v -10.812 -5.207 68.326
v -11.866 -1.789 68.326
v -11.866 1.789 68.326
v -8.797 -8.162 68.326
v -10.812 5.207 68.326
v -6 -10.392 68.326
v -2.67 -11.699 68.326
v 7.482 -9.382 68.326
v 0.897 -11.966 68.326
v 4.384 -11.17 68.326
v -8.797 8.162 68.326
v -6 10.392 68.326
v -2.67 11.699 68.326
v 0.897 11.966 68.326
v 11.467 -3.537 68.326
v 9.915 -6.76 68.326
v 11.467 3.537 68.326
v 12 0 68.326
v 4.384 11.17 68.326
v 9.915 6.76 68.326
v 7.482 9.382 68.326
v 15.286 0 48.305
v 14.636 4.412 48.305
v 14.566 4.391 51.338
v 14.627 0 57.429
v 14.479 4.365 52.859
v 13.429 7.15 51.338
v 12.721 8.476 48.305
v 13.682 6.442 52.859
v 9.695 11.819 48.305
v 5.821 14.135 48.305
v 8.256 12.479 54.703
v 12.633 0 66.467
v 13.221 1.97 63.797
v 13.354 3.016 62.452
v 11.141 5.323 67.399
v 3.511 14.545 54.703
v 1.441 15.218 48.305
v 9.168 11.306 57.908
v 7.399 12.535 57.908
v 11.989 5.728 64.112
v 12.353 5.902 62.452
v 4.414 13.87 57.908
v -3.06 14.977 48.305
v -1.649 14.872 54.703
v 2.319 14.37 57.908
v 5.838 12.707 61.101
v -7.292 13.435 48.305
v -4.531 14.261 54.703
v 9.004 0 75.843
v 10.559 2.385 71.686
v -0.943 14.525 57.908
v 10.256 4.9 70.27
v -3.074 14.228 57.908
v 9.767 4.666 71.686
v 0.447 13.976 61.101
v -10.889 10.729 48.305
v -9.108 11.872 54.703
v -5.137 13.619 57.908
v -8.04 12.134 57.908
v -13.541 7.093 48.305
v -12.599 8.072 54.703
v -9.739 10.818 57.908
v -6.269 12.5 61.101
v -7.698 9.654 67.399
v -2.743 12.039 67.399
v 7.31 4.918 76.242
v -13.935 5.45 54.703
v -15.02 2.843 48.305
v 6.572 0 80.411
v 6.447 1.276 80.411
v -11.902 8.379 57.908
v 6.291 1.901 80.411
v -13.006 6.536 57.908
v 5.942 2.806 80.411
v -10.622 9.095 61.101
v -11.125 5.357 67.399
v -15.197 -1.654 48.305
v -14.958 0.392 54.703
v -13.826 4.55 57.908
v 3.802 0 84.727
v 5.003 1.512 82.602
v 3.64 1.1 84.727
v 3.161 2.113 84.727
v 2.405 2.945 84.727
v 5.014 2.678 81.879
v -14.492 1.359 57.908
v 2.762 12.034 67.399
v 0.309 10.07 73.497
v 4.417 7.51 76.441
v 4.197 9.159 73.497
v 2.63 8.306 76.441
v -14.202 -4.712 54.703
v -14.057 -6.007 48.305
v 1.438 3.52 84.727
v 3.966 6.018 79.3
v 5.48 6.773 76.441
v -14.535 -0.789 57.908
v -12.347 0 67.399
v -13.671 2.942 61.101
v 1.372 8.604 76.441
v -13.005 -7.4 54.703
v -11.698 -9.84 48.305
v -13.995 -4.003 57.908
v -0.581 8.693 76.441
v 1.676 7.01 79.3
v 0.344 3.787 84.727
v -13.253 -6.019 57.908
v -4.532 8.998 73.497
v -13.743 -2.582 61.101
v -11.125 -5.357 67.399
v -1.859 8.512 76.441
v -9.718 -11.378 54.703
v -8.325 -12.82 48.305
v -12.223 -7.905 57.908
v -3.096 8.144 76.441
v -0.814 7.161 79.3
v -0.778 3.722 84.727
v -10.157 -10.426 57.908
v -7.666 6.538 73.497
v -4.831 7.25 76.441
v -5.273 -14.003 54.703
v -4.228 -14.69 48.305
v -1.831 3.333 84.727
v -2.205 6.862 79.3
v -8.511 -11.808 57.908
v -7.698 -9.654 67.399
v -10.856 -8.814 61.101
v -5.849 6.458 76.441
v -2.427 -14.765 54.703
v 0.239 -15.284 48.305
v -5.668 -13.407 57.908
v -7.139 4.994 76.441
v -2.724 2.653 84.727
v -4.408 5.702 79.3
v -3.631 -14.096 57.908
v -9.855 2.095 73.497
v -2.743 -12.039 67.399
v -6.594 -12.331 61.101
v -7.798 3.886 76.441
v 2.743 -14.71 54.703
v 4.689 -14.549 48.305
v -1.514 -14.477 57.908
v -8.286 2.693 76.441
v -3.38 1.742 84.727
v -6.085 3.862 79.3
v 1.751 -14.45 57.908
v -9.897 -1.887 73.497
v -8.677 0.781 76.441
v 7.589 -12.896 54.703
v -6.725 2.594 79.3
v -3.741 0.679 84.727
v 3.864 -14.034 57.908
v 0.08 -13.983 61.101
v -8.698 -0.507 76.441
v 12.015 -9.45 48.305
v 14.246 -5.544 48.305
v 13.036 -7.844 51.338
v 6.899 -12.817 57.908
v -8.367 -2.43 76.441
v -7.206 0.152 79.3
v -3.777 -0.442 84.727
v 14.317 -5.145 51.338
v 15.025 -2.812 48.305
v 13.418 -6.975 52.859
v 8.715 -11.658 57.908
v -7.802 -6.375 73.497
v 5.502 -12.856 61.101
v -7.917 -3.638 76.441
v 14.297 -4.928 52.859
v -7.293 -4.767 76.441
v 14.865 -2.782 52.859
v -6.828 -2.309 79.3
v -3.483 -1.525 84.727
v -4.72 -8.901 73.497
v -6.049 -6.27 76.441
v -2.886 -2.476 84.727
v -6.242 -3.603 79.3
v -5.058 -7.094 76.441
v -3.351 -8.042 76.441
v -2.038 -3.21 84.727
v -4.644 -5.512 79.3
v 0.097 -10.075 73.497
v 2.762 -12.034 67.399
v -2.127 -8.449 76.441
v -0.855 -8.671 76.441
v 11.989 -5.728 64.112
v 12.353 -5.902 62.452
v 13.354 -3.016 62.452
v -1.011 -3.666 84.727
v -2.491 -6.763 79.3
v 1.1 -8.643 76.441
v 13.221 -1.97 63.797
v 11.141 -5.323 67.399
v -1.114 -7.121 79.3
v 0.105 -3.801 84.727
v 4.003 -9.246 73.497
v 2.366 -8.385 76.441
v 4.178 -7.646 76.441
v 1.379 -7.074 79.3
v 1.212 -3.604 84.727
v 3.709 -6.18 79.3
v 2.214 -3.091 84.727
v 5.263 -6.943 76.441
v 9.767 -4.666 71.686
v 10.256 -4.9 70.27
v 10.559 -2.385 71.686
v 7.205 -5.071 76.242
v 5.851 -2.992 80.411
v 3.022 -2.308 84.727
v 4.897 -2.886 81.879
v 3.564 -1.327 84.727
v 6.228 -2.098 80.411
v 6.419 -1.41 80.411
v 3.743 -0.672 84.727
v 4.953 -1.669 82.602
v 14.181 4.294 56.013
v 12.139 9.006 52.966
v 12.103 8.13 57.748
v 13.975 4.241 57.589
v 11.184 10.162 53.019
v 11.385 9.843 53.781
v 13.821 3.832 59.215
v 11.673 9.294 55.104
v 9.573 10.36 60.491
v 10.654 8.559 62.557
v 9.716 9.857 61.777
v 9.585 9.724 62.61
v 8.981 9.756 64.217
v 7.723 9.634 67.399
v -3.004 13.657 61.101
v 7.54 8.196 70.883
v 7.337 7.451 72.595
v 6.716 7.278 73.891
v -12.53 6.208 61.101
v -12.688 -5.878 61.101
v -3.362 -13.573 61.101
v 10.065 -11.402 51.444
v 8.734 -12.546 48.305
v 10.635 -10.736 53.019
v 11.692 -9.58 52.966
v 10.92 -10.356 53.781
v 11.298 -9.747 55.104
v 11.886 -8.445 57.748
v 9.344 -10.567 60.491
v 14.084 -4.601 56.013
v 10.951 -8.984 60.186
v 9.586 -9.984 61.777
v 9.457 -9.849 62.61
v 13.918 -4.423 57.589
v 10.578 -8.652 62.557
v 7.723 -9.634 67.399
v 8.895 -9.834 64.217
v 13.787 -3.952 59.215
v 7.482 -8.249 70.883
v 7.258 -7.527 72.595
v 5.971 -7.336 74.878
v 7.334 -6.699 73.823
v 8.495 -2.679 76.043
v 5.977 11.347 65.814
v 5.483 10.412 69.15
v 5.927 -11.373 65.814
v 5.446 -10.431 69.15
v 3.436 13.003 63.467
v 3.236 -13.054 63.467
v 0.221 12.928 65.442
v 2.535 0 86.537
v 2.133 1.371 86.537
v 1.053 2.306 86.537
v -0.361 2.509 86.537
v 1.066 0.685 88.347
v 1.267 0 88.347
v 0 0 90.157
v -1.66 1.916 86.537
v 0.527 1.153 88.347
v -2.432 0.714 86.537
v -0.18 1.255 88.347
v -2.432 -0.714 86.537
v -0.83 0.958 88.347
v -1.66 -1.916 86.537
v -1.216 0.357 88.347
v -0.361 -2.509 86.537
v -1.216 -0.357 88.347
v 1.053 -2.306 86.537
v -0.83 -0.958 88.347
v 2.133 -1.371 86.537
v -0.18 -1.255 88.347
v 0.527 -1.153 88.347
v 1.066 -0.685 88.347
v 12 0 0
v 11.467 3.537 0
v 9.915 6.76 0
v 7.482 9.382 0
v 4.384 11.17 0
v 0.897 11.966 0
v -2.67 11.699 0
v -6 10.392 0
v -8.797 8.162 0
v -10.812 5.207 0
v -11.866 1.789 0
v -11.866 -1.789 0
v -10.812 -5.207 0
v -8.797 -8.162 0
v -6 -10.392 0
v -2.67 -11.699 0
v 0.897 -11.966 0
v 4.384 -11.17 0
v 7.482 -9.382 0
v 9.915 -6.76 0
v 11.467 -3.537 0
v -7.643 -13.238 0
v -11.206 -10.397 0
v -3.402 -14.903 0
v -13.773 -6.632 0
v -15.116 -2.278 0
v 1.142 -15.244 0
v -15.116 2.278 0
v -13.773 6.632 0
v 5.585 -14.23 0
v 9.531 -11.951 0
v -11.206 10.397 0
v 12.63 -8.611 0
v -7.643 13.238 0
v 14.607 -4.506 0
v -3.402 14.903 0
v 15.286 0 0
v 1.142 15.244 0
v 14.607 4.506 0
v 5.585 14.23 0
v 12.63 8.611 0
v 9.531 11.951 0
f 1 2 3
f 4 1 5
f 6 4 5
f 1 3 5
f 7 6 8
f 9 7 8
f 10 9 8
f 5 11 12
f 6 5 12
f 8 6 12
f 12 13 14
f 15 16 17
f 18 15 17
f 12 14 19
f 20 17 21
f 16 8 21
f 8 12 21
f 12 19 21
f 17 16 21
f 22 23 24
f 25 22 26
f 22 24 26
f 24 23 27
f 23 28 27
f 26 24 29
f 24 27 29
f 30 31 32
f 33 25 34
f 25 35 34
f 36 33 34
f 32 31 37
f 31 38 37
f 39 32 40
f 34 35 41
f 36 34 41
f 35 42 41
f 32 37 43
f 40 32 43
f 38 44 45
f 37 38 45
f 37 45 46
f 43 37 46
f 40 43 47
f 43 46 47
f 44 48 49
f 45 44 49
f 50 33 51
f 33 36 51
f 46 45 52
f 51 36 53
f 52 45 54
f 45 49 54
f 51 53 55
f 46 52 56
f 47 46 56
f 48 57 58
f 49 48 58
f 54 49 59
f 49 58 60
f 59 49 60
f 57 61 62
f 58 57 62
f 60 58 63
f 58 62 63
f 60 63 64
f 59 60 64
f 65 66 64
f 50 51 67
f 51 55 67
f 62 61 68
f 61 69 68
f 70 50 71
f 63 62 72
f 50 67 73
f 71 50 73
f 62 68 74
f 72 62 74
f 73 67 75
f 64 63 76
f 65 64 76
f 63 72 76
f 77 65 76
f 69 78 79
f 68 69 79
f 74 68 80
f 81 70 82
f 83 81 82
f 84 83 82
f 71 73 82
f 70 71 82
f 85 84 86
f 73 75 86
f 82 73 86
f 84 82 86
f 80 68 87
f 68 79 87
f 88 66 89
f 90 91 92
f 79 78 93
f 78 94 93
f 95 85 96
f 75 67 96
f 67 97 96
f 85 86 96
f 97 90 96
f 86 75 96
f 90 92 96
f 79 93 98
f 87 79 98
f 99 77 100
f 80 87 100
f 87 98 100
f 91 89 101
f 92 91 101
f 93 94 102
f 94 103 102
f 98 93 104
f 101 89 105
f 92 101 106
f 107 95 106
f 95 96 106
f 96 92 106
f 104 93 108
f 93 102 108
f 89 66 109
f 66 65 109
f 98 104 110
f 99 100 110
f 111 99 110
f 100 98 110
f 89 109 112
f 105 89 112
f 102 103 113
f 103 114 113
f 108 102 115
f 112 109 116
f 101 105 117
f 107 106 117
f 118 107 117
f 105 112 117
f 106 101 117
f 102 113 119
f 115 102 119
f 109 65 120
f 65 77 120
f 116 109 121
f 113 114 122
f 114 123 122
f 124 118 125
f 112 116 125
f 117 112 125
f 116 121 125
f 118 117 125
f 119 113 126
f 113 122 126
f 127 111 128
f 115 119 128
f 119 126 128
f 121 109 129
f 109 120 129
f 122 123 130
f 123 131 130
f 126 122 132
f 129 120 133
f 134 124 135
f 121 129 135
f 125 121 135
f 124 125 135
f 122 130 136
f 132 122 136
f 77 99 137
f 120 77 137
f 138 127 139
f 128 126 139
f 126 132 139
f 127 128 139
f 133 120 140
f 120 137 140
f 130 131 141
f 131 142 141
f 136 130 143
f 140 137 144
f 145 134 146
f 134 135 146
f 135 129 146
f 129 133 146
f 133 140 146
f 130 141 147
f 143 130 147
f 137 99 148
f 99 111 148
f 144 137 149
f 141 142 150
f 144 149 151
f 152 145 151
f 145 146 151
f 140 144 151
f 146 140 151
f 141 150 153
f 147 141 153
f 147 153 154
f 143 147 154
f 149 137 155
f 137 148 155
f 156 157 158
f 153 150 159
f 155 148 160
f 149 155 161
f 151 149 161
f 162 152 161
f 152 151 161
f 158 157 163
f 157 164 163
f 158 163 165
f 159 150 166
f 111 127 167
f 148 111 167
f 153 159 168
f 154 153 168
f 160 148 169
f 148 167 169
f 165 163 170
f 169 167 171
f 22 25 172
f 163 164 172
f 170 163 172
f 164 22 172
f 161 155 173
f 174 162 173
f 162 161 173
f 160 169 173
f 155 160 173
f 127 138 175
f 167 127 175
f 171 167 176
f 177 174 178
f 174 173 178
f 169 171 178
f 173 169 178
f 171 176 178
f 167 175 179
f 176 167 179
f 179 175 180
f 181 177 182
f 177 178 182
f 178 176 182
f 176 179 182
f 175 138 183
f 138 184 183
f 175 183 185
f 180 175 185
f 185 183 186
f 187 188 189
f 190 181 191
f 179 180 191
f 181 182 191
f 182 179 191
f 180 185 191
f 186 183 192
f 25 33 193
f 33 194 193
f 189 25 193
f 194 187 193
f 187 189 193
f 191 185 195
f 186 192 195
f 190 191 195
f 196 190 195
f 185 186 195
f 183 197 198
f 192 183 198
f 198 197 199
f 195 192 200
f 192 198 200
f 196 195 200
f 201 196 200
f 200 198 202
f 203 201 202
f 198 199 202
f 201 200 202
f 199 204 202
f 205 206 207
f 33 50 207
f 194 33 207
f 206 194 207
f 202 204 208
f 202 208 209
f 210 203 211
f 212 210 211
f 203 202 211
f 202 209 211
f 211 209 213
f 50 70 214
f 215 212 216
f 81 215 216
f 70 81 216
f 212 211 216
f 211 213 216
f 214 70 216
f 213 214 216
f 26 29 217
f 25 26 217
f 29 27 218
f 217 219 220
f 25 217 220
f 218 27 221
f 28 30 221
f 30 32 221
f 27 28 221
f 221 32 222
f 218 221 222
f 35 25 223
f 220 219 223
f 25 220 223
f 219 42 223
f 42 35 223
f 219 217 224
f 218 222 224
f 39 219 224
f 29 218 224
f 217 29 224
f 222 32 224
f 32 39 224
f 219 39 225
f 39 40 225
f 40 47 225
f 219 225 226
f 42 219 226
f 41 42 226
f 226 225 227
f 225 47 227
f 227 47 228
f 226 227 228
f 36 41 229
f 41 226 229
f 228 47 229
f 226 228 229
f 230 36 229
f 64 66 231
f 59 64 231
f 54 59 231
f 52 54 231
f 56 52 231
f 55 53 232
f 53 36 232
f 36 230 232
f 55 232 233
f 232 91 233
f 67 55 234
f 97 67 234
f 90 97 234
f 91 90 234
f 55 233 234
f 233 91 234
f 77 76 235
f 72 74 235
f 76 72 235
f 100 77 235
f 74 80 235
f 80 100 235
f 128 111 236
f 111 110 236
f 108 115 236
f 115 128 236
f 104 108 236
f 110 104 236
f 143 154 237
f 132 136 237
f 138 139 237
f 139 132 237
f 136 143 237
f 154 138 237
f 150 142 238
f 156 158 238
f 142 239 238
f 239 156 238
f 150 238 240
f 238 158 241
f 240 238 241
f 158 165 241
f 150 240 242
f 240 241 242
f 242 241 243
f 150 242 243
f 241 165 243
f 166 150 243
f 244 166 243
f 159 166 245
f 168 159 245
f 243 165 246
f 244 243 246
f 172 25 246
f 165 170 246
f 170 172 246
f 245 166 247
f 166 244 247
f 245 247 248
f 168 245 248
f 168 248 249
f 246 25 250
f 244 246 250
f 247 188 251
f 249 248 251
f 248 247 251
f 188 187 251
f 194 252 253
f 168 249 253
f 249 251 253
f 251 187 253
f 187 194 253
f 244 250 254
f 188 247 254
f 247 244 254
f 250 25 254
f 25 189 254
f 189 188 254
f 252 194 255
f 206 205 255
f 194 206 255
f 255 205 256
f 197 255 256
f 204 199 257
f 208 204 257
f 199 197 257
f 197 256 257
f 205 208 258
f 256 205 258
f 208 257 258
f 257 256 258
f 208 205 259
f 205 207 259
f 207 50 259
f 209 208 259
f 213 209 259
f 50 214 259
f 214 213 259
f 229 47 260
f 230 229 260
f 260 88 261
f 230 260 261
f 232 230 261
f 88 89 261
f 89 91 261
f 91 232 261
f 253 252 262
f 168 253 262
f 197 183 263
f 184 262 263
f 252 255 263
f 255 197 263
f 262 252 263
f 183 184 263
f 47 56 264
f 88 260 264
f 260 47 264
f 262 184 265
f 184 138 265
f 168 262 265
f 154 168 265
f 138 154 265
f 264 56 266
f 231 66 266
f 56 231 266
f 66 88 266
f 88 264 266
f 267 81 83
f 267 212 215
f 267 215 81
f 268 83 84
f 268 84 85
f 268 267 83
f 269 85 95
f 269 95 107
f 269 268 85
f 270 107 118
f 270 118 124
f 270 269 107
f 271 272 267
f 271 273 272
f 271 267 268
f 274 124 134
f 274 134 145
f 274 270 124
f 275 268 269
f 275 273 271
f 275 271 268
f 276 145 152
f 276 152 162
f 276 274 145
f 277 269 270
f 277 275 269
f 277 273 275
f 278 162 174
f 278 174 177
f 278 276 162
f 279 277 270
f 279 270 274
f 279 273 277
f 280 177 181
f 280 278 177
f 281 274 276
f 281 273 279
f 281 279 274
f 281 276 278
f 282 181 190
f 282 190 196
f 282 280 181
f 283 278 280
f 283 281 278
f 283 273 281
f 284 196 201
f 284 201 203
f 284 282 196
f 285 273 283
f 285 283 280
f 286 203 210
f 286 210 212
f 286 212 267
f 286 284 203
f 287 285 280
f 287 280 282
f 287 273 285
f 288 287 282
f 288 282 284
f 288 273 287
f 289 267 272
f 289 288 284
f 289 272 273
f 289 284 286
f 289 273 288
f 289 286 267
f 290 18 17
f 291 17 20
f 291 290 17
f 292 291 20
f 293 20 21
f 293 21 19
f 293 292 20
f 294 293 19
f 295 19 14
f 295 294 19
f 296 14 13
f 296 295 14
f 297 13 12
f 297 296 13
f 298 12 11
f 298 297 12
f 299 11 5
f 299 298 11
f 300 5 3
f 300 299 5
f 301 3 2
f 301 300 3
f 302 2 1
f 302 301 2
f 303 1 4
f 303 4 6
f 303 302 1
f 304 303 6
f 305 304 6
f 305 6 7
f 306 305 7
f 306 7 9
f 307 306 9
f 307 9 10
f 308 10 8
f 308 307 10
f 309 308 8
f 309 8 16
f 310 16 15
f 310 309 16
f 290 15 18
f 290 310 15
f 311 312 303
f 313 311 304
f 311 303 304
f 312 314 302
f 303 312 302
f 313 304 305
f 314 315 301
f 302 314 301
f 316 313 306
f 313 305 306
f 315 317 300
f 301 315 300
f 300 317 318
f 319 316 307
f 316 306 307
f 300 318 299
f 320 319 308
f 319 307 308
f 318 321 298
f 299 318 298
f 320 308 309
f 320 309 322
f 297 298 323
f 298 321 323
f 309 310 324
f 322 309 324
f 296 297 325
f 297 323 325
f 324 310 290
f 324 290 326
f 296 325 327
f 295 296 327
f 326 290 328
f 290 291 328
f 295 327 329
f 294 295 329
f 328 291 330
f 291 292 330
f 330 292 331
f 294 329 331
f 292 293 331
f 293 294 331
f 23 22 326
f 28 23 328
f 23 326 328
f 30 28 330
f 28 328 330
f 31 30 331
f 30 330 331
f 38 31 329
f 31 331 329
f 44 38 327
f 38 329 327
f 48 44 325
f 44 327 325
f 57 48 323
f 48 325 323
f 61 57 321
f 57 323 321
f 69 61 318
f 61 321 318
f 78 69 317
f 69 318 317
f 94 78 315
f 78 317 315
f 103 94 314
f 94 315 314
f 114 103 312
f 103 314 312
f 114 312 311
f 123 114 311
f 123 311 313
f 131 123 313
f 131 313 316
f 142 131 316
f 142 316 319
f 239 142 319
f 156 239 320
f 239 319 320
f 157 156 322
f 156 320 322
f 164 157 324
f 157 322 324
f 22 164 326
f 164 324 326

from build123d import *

# Parameters (mm, degrees)
F0_R     = 15.286331743
F0_R_2   = 12
F1_DEPTH = 68.326
F2_R     = 15.286331743
F3_DEPTH = 25.4
F3_TAPER = 35
F4_R     = 63.5


with BuildPart() as f1:
    # F0 (on Top) → F1 (new body)
    with BuildSketch(Plane.XY):
        Circle(F0_R)
        Circle(F0_R_2, mode=Mode.SUBTRACT)
    extrude(amount=F1_DEPTH)

    # F2 (on face) → F3 (join)
    with BuildSketch(Plane.XY.offset(68.326)):
        Circle(F2_R)
    extrude(amount=F3_DEPTH, taper=F3_TAPER)

    # F4
    f4_edges = [f1.edges().sort_by_distance(p)[0] for p in [
        (-15.286332, 0, 68.326),
    ]]
    fillet(f4_edges, radius=F4_R)


solid = f1.part
